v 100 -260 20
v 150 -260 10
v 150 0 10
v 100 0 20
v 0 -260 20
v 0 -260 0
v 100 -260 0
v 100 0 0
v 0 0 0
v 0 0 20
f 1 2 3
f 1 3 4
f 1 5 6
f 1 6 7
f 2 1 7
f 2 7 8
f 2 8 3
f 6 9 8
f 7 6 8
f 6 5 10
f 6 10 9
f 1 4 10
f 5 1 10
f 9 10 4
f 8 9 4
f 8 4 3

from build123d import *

# Parameters (mm, degrees)
F1_DEPTH = 260


with BuildPart() as f1:
    # F0 (on Front) → F1 (new body)
    with BuildSketch(Plane.XZ):
        Polygon((0, 20), (0, 0), (100, 0), (100, 10), (100, 20), align=None)
        Polygon((100, 20), (100, 10), (150, 10), align=None)
        Polygon((100, 10), (100, 0), (150, 10), align=None)
    extrude(amount=F1_DEPTH)


solid = f1.part
